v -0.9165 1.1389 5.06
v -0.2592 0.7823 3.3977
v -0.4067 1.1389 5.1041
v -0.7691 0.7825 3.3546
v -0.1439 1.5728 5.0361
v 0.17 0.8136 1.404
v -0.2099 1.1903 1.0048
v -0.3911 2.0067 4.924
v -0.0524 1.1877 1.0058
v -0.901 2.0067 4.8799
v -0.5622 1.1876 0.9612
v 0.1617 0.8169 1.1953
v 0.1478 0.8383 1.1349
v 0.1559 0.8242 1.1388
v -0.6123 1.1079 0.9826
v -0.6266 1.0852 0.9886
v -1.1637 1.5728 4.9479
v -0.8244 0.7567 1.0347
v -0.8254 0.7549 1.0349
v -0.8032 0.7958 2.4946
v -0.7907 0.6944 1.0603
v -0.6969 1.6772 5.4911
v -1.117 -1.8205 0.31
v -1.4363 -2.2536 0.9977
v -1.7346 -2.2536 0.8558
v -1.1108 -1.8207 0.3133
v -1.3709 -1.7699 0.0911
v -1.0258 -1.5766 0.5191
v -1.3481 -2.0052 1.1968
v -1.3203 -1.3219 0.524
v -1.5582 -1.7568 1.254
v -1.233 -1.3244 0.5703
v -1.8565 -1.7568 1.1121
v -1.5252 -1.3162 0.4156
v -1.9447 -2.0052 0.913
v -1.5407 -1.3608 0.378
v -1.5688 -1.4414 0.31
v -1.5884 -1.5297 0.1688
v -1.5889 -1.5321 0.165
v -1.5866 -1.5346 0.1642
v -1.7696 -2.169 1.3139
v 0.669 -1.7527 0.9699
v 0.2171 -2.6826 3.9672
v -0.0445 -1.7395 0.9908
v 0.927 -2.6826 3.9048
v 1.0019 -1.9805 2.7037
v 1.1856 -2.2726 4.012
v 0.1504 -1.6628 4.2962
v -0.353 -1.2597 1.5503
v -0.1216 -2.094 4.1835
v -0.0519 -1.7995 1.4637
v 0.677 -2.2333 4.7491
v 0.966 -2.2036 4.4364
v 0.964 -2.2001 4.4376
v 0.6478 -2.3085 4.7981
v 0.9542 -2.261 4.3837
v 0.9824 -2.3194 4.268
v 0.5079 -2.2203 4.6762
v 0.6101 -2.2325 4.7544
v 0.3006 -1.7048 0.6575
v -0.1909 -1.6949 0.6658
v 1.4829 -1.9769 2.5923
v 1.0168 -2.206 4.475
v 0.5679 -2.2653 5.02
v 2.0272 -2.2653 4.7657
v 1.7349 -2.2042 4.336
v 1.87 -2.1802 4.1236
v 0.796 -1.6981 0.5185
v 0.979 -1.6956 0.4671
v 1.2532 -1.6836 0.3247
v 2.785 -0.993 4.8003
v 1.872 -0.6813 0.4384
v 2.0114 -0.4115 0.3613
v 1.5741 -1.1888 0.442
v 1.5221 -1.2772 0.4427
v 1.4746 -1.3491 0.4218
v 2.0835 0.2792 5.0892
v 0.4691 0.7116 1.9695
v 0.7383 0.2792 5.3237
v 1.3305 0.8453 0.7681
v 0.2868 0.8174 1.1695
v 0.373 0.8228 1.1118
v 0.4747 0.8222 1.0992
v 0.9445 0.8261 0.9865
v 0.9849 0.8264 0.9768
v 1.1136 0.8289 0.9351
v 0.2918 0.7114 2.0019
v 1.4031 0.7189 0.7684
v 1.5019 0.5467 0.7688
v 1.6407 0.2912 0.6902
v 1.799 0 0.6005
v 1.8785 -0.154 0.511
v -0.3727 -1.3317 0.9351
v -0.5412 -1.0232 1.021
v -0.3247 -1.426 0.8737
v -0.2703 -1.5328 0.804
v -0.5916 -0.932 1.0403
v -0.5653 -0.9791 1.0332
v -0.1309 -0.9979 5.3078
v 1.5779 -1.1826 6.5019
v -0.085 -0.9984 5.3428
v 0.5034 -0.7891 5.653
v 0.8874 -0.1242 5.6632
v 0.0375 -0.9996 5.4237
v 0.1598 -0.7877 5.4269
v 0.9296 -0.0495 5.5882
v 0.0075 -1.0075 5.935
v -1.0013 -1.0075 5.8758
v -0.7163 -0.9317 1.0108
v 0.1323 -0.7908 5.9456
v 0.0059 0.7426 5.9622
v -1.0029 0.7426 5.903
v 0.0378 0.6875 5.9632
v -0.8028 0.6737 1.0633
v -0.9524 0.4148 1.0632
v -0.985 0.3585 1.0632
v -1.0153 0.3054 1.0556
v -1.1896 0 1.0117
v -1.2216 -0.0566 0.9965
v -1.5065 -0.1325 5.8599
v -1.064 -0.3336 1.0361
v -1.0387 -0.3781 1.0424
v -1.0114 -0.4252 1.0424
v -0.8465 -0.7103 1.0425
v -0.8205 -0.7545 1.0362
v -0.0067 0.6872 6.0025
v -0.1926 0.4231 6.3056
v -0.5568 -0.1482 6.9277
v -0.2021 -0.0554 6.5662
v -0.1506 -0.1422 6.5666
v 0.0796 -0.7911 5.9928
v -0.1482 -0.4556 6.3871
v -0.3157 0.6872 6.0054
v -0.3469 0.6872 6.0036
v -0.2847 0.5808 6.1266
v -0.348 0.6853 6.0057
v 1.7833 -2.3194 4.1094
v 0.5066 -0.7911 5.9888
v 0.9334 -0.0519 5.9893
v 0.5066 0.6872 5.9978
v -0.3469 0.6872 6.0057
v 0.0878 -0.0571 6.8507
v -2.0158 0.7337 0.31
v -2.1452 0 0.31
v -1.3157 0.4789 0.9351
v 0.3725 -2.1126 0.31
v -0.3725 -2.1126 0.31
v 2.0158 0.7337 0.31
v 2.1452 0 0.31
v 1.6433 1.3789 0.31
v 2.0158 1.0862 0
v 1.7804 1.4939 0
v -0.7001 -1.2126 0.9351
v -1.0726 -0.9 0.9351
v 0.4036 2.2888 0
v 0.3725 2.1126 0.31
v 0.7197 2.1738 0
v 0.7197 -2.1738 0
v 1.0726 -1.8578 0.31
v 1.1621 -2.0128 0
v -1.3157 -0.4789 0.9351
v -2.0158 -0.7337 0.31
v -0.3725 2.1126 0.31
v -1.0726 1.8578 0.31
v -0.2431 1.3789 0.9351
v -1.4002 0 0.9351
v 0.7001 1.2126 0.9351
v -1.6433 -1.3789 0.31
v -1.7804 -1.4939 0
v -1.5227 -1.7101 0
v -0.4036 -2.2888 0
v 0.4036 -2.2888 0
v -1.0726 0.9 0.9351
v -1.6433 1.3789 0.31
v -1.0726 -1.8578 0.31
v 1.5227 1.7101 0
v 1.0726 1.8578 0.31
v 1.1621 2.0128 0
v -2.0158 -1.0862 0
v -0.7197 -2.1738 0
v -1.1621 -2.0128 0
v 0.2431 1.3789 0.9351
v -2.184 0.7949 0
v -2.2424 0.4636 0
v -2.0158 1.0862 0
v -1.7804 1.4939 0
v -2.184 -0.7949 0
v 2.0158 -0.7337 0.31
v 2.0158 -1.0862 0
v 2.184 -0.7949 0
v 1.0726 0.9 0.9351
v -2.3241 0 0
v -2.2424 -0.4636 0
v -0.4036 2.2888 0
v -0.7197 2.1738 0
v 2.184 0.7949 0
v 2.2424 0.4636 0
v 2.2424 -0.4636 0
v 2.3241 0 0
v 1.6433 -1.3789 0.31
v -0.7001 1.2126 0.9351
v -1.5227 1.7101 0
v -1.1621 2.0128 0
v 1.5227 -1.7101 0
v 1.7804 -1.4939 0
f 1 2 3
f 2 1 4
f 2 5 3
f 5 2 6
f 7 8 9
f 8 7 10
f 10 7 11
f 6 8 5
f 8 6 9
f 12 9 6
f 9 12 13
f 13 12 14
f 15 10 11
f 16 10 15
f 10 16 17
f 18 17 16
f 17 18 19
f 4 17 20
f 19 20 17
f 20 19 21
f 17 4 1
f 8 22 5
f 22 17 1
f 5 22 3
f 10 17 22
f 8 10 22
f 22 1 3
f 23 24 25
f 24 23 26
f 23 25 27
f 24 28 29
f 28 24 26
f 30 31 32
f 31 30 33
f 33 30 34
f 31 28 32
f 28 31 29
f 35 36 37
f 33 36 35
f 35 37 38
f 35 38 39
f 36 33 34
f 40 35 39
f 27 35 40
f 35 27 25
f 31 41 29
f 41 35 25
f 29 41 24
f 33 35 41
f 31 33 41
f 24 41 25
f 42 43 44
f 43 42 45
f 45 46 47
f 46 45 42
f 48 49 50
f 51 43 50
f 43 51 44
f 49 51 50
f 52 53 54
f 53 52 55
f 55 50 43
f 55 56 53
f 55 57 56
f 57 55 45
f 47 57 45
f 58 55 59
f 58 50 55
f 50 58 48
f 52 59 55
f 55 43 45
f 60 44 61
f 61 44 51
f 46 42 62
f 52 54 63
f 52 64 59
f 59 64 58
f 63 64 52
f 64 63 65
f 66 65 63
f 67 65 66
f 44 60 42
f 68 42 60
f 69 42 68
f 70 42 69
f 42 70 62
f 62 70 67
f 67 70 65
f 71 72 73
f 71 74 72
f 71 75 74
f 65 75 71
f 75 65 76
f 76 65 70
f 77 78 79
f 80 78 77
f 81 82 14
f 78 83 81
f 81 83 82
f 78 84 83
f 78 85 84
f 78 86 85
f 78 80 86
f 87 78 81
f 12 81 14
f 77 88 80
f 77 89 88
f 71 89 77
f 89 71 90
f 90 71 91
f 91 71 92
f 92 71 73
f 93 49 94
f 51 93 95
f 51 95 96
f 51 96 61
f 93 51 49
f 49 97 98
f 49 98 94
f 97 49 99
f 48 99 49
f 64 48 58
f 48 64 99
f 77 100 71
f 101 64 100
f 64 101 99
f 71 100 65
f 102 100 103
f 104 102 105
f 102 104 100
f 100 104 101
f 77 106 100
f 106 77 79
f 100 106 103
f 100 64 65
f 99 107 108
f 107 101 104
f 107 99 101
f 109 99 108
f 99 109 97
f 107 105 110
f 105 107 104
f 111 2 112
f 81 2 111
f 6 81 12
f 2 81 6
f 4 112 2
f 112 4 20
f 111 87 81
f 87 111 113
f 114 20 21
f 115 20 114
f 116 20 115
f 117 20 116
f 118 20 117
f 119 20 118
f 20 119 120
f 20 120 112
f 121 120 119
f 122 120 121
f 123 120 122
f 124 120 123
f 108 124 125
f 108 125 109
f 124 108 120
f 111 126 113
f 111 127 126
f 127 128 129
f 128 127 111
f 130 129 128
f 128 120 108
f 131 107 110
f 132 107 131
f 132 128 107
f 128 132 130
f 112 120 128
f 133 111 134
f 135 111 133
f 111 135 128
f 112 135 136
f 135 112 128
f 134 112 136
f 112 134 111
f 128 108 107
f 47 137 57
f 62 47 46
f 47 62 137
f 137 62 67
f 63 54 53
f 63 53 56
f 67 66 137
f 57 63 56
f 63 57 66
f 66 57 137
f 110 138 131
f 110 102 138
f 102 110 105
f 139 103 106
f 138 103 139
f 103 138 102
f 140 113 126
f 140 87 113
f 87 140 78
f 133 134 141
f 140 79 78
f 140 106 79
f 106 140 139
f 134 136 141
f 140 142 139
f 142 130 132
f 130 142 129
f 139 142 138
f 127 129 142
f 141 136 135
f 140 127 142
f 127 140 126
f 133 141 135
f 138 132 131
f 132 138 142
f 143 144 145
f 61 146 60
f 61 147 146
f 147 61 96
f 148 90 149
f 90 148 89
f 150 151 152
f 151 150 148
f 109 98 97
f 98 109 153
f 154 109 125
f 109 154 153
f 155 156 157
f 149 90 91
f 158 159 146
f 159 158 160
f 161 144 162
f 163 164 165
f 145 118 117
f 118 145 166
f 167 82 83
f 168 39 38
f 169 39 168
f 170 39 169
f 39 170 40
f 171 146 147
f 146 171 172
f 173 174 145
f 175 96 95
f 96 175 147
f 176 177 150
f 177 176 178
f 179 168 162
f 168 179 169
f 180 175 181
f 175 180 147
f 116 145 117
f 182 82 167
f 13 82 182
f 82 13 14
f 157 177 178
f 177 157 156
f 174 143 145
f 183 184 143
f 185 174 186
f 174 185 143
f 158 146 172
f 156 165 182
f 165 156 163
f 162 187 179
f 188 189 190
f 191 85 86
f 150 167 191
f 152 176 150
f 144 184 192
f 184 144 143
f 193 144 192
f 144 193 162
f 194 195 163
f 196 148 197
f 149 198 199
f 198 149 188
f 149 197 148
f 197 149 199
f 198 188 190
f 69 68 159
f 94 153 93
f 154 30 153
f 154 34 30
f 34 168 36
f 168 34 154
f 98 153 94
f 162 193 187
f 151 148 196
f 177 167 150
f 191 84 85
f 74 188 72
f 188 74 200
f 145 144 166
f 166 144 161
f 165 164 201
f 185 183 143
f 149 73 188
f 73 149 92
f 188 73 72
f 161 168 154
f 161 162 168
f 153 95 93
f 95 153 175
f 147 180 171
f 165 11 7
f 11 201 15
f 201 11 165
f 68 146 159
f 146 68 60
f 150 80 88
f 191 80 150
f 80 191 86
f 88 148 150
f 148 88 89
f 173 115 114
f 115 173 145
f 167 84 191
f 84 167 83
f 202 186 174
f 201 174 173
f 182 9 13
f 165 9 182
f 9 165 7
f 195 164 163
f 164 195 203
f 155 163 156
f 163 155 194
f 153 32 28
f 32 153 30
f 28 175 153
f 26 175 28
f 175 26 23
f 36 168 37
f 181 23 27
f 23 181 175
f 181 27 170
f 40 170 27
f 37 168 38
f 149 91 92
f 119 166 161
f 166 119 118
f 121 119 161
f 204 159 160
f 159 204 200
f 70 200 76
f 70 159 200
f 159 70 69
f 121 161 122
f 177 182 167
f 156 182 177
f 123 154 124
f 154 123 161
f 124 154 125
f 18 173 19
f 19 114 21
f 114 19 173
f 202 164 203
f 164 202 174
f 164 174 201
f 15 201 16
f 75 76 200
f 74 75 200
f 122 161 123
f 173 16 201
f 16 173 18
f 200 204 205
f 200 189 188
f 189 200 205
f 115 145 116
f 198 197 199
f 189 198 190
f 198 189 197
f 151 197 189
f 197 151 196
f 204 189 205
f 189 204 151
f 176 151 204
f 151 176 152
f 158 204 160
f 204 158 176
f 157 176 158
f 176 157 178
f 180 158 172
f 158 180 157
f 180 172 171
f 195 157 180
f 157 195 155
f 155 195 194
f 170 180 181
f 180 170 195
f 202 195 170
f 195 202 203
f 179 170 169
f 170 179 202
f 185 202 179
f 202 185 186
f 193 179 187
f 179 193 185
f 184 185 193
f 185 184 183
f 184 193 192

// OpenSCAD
//Customizable Tothite
//Inspired by "Giant Crystal" (http://www.thingiverse.com/thing:189703) by Tothe (http://www.thingiverse.com/Tothe/designs)
//Using modified code written by me in (http://www.thingiverse.com/thing:142079)
//Created by Ari M. Diacou, November 2013
//Shared under Creative Commons License: Attribution-ShareAlike 3.0 Unported (CC BY-SA 3.0) 
//see http://creativecommons.org/licenses/by-sa/3.0/


//A way to save your "random" arrangement
seed=5;				
//Number of crystals
num=8;							
//Minimum width of crystals
min_width=.5;
//Minimum width of crystals
max_width=3;
//Height of each crystal
high=6;
//Number of sides on each crystal
num_sides=6;
//Lower numbers will have shorter outer crystals
dropoff=.8;
//Overhang angle of the outermost crystals
bouquet_angle=40;
//The density of the crystals
density=10;
//For fine-tuning the width of the base
base_width=7; //[0:10]

R_max=(.1*base_width*max_width+.1*(10-base_width)*min_width)*num/density;
angle=rands(0,360*10,num+1,seed); //The azimuthal angle that the axis of the crystal will be at
crystal_length=rands(0,R_max,num+1,seed+2); 
crystal_width=rands(min_width,max_width,num+1,seed+1);
hyp=R_max/sin(bouquet_angle);
adj=R_max*cos(bouquet_angle)/sin(bouquet_angle);
difference(){
	union(){
		translate([0,0,-2*adj+hyp]) 
			sphere(hyp,$fn=3*num_sides);
		for(i=[1:num]){
			translate([crystal_length[i]*cos(angle[i]),crystal_length[i]*sin(angle[i]),0]) 
				rotate([-bouquet_angle*sin(angle[i])*crystal_length[i]/R_max,bouquet_angle*cos(angle[i])*crystal_length[i]/R_max,0])
					crystal(num_sides,high*exp(-pow((crystal_length[i]/(dropoff*R_max)),2)),crystal_width[i]/2,crystal_width[i]/2);
		}
	}
	translate([0,0,-.5*max_width*hyp]) 
		cube(max_width*hyp,true);
	}

module crystal(sides, height, width, taper_height){
	cylinder(height,width,width,$fn=sides);
	translate([0,0,height]) 
		cylinder(taper_height,width,0*width/2,$fn=sides);
	}
